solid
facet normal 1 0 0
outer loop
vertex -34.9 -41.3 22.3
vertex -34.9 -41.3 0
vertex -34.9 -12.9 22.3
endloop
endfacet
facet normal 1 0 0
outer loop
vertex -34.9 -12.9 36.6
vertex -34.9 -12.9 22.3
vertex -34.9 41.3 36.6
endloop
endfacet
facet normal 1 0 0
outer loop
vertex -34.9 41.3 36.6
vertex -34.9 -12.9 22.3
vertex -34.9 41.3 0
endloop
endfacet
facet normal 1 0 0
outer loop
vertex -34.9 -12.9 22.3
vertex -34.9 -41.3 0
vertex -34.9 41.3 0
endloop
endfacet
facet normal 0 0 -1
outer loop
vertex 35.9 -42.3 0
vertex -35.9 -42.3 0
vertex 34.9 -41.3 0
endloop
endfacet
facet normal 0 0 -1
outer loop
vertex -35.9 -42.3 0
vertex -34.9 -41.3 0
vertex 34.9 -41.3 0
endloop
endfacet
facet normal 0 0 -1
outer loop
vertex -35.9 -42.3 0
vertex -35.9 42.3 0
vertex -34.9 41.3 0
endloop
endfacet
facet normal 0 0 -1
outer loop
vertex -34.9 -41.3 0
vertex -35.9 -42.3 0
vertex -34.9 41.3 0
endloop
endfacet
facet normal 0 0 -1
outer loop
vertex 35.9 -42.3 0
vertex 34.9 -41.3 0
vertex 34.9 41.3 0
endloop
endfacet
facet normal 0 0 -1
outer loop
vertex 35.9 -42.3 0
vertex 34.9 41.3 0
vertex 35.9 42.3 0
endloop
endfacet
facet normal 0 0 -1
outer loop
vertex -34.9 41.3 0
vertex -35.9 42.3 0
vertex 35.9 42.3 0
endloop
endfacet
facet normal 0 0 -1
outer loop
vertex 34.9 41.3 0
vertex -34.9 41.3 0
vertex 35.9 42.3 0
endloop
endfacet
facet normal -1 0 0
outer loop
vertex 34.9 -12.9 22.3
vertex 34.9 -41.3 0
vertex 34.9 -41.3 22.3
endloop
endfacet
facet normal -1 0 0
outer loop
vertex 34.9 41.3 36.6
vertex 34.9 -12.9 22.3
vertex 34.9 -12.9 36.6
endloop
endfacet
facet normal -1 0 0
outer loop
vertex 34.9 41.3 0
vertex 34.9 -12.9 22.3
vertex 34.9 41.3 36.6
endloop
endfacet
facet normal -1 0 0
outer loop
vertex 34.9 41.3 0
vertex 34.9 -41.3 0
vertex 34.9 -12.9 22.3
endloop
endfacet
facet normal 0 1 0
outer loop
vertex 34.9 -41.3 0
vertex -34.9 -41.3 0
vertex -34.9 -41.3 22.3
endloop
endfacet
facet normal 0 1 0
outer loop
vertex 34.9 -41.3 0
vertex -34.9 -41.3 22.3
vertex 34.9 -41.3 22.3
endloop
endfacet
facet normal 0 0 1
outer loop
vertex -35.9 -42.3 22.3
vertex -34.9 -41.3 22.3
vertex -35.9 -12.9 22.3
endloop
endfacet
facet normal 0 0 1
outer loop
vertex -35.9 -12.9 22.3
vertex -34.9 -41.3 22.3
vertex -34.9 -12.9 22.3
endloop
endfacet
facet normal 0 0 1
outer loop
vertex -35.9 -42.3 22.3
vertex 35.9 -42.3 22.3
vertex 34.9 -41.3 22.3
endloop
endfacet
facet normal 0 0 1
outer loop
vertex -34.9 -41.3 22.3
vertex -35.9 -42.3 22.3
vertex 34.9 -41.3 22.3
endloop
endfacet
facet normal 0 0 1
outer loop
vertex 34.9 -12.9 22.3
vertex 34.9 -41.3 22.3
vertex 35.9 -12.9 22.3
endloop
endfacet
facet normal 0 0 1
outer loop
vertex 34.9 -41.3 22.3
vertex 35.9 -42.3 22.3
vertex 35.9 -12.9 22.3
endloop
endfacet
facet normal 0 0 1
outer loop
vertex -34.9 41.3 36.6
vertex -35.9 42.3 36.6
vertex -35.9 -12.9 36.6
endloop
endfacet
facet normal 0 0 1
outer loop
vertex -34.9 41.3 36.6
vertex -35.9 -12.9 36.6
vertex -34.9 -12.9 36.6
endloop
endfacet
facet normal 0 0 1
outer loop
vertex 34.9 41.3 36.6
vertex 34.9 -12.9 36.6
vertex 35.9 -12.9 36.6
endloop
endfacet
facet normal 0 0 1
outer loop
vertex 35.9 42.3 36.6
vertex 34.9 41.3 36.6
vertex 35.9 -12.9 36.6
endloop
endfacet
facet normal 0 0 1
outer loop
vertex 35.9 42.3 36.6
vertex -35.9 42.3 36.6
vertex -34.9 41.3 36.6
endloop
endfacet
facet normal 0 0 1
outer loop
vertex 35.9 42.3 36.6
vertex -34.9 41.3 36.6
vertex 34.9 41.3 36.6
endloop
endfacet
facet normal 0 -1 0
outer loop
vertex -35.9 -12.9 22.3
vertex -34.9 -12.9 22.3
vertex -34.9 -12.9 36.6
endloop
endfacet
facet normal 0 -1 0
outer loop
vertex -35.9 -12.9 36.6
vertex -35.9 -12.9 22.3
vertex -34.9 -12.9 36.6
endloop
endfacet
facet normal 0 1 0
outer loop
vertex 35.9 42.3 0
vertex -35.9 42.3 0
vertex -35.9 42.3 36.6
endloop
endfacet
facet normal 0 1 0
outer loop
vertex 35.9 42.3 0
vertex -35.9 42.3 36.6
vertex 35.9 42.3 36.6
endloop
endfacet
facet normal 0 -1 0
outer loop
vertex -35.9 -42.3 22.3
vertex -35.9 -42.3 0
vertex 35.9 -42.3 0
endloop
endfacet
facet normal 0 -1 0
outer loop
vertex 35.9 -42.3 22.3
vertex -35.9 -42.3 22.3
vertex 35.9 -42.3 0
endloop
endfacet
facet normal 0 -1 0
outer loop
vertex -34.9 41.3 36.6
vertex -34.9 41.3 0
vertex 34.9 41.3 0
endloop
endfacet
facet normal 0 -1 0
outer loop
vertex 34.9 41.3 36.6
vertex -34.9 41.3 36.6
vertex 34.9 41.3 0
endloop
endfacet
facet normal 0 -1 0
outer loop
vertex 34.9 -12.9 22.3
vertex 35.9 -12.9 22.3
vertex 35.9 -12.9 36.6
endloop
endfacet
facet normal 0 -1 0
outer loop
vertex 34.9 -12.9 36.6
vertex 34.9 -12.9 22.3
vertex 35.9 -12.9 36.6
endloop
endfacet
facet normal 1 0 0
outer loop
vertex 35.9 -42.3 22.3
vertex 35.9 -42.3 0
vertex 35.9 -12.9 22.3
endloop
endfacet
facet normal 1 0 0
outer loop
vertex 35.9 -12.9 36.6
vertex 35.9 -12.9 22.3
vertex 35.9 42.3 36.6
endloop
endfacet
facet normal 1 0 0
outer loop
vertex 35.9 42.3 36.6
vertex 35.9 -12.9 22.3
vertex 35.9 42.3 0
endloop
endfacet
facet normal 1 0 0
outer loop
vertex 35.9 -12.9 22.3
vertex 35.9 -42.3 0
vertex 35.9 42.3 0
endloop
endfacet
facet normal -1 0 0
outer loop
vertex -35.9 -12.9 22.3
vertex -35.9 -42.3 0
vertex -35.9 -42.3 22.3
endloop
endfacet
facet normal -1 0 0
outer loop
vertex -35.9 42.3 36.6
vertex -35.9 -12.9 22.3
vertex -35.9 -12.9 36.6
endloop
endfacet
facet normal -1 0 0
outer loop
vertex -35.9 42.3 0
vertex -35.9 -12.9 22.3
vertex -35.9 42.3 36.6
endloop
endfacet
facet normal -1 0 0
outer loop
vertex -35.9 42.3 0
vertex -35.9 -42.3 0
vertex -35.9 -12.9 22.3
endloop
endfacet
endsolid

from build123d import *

# Parameters (mm, degrees)
F0_W     = 71.8
F0_H     = 84.6
F2_DEPTH = 36.6
F3_DEPTH = 2
F1_W     = 69.8
F1_H     = 82.6
F4_DEPTH = 36.6
F5_W     = 29.4
F5_H     = 14.3
F6_DEPTH = 71.8


with BuildPart() as f2:
    # F0 (on Top) → F2 (new body)
    with BuildSketch(Plane.XY):
        Rectangle(F0_W, F0_H)
    extrude(amount=F2_DEPTH)

    # F0 (on Top) → F3 (join)
    with BuildSketch(Plane.XY):
        Rectangle(F0_W, F0_H)
    extrude(amount=F3_DEPTH)

    # F1 (on face) → F4 (cut)
    with BuildSketch(Plane.XY):
        Rectangle(F1_W, F1_H)
    extrude(amount=F4_DEPTH, mode=Mode.SUBTRACT)

    # F5 (on face) → F6 (cut)
    with BuildSketch(Plane.YZ.offset(35.9)):
        with Locations((-27.6, 29.45)):
            Rectangle(F5_W, F5_H)
    extrude(amount=-F6_DEPTH, mode=Mode.SUBTRACT)


solid = f2.part
